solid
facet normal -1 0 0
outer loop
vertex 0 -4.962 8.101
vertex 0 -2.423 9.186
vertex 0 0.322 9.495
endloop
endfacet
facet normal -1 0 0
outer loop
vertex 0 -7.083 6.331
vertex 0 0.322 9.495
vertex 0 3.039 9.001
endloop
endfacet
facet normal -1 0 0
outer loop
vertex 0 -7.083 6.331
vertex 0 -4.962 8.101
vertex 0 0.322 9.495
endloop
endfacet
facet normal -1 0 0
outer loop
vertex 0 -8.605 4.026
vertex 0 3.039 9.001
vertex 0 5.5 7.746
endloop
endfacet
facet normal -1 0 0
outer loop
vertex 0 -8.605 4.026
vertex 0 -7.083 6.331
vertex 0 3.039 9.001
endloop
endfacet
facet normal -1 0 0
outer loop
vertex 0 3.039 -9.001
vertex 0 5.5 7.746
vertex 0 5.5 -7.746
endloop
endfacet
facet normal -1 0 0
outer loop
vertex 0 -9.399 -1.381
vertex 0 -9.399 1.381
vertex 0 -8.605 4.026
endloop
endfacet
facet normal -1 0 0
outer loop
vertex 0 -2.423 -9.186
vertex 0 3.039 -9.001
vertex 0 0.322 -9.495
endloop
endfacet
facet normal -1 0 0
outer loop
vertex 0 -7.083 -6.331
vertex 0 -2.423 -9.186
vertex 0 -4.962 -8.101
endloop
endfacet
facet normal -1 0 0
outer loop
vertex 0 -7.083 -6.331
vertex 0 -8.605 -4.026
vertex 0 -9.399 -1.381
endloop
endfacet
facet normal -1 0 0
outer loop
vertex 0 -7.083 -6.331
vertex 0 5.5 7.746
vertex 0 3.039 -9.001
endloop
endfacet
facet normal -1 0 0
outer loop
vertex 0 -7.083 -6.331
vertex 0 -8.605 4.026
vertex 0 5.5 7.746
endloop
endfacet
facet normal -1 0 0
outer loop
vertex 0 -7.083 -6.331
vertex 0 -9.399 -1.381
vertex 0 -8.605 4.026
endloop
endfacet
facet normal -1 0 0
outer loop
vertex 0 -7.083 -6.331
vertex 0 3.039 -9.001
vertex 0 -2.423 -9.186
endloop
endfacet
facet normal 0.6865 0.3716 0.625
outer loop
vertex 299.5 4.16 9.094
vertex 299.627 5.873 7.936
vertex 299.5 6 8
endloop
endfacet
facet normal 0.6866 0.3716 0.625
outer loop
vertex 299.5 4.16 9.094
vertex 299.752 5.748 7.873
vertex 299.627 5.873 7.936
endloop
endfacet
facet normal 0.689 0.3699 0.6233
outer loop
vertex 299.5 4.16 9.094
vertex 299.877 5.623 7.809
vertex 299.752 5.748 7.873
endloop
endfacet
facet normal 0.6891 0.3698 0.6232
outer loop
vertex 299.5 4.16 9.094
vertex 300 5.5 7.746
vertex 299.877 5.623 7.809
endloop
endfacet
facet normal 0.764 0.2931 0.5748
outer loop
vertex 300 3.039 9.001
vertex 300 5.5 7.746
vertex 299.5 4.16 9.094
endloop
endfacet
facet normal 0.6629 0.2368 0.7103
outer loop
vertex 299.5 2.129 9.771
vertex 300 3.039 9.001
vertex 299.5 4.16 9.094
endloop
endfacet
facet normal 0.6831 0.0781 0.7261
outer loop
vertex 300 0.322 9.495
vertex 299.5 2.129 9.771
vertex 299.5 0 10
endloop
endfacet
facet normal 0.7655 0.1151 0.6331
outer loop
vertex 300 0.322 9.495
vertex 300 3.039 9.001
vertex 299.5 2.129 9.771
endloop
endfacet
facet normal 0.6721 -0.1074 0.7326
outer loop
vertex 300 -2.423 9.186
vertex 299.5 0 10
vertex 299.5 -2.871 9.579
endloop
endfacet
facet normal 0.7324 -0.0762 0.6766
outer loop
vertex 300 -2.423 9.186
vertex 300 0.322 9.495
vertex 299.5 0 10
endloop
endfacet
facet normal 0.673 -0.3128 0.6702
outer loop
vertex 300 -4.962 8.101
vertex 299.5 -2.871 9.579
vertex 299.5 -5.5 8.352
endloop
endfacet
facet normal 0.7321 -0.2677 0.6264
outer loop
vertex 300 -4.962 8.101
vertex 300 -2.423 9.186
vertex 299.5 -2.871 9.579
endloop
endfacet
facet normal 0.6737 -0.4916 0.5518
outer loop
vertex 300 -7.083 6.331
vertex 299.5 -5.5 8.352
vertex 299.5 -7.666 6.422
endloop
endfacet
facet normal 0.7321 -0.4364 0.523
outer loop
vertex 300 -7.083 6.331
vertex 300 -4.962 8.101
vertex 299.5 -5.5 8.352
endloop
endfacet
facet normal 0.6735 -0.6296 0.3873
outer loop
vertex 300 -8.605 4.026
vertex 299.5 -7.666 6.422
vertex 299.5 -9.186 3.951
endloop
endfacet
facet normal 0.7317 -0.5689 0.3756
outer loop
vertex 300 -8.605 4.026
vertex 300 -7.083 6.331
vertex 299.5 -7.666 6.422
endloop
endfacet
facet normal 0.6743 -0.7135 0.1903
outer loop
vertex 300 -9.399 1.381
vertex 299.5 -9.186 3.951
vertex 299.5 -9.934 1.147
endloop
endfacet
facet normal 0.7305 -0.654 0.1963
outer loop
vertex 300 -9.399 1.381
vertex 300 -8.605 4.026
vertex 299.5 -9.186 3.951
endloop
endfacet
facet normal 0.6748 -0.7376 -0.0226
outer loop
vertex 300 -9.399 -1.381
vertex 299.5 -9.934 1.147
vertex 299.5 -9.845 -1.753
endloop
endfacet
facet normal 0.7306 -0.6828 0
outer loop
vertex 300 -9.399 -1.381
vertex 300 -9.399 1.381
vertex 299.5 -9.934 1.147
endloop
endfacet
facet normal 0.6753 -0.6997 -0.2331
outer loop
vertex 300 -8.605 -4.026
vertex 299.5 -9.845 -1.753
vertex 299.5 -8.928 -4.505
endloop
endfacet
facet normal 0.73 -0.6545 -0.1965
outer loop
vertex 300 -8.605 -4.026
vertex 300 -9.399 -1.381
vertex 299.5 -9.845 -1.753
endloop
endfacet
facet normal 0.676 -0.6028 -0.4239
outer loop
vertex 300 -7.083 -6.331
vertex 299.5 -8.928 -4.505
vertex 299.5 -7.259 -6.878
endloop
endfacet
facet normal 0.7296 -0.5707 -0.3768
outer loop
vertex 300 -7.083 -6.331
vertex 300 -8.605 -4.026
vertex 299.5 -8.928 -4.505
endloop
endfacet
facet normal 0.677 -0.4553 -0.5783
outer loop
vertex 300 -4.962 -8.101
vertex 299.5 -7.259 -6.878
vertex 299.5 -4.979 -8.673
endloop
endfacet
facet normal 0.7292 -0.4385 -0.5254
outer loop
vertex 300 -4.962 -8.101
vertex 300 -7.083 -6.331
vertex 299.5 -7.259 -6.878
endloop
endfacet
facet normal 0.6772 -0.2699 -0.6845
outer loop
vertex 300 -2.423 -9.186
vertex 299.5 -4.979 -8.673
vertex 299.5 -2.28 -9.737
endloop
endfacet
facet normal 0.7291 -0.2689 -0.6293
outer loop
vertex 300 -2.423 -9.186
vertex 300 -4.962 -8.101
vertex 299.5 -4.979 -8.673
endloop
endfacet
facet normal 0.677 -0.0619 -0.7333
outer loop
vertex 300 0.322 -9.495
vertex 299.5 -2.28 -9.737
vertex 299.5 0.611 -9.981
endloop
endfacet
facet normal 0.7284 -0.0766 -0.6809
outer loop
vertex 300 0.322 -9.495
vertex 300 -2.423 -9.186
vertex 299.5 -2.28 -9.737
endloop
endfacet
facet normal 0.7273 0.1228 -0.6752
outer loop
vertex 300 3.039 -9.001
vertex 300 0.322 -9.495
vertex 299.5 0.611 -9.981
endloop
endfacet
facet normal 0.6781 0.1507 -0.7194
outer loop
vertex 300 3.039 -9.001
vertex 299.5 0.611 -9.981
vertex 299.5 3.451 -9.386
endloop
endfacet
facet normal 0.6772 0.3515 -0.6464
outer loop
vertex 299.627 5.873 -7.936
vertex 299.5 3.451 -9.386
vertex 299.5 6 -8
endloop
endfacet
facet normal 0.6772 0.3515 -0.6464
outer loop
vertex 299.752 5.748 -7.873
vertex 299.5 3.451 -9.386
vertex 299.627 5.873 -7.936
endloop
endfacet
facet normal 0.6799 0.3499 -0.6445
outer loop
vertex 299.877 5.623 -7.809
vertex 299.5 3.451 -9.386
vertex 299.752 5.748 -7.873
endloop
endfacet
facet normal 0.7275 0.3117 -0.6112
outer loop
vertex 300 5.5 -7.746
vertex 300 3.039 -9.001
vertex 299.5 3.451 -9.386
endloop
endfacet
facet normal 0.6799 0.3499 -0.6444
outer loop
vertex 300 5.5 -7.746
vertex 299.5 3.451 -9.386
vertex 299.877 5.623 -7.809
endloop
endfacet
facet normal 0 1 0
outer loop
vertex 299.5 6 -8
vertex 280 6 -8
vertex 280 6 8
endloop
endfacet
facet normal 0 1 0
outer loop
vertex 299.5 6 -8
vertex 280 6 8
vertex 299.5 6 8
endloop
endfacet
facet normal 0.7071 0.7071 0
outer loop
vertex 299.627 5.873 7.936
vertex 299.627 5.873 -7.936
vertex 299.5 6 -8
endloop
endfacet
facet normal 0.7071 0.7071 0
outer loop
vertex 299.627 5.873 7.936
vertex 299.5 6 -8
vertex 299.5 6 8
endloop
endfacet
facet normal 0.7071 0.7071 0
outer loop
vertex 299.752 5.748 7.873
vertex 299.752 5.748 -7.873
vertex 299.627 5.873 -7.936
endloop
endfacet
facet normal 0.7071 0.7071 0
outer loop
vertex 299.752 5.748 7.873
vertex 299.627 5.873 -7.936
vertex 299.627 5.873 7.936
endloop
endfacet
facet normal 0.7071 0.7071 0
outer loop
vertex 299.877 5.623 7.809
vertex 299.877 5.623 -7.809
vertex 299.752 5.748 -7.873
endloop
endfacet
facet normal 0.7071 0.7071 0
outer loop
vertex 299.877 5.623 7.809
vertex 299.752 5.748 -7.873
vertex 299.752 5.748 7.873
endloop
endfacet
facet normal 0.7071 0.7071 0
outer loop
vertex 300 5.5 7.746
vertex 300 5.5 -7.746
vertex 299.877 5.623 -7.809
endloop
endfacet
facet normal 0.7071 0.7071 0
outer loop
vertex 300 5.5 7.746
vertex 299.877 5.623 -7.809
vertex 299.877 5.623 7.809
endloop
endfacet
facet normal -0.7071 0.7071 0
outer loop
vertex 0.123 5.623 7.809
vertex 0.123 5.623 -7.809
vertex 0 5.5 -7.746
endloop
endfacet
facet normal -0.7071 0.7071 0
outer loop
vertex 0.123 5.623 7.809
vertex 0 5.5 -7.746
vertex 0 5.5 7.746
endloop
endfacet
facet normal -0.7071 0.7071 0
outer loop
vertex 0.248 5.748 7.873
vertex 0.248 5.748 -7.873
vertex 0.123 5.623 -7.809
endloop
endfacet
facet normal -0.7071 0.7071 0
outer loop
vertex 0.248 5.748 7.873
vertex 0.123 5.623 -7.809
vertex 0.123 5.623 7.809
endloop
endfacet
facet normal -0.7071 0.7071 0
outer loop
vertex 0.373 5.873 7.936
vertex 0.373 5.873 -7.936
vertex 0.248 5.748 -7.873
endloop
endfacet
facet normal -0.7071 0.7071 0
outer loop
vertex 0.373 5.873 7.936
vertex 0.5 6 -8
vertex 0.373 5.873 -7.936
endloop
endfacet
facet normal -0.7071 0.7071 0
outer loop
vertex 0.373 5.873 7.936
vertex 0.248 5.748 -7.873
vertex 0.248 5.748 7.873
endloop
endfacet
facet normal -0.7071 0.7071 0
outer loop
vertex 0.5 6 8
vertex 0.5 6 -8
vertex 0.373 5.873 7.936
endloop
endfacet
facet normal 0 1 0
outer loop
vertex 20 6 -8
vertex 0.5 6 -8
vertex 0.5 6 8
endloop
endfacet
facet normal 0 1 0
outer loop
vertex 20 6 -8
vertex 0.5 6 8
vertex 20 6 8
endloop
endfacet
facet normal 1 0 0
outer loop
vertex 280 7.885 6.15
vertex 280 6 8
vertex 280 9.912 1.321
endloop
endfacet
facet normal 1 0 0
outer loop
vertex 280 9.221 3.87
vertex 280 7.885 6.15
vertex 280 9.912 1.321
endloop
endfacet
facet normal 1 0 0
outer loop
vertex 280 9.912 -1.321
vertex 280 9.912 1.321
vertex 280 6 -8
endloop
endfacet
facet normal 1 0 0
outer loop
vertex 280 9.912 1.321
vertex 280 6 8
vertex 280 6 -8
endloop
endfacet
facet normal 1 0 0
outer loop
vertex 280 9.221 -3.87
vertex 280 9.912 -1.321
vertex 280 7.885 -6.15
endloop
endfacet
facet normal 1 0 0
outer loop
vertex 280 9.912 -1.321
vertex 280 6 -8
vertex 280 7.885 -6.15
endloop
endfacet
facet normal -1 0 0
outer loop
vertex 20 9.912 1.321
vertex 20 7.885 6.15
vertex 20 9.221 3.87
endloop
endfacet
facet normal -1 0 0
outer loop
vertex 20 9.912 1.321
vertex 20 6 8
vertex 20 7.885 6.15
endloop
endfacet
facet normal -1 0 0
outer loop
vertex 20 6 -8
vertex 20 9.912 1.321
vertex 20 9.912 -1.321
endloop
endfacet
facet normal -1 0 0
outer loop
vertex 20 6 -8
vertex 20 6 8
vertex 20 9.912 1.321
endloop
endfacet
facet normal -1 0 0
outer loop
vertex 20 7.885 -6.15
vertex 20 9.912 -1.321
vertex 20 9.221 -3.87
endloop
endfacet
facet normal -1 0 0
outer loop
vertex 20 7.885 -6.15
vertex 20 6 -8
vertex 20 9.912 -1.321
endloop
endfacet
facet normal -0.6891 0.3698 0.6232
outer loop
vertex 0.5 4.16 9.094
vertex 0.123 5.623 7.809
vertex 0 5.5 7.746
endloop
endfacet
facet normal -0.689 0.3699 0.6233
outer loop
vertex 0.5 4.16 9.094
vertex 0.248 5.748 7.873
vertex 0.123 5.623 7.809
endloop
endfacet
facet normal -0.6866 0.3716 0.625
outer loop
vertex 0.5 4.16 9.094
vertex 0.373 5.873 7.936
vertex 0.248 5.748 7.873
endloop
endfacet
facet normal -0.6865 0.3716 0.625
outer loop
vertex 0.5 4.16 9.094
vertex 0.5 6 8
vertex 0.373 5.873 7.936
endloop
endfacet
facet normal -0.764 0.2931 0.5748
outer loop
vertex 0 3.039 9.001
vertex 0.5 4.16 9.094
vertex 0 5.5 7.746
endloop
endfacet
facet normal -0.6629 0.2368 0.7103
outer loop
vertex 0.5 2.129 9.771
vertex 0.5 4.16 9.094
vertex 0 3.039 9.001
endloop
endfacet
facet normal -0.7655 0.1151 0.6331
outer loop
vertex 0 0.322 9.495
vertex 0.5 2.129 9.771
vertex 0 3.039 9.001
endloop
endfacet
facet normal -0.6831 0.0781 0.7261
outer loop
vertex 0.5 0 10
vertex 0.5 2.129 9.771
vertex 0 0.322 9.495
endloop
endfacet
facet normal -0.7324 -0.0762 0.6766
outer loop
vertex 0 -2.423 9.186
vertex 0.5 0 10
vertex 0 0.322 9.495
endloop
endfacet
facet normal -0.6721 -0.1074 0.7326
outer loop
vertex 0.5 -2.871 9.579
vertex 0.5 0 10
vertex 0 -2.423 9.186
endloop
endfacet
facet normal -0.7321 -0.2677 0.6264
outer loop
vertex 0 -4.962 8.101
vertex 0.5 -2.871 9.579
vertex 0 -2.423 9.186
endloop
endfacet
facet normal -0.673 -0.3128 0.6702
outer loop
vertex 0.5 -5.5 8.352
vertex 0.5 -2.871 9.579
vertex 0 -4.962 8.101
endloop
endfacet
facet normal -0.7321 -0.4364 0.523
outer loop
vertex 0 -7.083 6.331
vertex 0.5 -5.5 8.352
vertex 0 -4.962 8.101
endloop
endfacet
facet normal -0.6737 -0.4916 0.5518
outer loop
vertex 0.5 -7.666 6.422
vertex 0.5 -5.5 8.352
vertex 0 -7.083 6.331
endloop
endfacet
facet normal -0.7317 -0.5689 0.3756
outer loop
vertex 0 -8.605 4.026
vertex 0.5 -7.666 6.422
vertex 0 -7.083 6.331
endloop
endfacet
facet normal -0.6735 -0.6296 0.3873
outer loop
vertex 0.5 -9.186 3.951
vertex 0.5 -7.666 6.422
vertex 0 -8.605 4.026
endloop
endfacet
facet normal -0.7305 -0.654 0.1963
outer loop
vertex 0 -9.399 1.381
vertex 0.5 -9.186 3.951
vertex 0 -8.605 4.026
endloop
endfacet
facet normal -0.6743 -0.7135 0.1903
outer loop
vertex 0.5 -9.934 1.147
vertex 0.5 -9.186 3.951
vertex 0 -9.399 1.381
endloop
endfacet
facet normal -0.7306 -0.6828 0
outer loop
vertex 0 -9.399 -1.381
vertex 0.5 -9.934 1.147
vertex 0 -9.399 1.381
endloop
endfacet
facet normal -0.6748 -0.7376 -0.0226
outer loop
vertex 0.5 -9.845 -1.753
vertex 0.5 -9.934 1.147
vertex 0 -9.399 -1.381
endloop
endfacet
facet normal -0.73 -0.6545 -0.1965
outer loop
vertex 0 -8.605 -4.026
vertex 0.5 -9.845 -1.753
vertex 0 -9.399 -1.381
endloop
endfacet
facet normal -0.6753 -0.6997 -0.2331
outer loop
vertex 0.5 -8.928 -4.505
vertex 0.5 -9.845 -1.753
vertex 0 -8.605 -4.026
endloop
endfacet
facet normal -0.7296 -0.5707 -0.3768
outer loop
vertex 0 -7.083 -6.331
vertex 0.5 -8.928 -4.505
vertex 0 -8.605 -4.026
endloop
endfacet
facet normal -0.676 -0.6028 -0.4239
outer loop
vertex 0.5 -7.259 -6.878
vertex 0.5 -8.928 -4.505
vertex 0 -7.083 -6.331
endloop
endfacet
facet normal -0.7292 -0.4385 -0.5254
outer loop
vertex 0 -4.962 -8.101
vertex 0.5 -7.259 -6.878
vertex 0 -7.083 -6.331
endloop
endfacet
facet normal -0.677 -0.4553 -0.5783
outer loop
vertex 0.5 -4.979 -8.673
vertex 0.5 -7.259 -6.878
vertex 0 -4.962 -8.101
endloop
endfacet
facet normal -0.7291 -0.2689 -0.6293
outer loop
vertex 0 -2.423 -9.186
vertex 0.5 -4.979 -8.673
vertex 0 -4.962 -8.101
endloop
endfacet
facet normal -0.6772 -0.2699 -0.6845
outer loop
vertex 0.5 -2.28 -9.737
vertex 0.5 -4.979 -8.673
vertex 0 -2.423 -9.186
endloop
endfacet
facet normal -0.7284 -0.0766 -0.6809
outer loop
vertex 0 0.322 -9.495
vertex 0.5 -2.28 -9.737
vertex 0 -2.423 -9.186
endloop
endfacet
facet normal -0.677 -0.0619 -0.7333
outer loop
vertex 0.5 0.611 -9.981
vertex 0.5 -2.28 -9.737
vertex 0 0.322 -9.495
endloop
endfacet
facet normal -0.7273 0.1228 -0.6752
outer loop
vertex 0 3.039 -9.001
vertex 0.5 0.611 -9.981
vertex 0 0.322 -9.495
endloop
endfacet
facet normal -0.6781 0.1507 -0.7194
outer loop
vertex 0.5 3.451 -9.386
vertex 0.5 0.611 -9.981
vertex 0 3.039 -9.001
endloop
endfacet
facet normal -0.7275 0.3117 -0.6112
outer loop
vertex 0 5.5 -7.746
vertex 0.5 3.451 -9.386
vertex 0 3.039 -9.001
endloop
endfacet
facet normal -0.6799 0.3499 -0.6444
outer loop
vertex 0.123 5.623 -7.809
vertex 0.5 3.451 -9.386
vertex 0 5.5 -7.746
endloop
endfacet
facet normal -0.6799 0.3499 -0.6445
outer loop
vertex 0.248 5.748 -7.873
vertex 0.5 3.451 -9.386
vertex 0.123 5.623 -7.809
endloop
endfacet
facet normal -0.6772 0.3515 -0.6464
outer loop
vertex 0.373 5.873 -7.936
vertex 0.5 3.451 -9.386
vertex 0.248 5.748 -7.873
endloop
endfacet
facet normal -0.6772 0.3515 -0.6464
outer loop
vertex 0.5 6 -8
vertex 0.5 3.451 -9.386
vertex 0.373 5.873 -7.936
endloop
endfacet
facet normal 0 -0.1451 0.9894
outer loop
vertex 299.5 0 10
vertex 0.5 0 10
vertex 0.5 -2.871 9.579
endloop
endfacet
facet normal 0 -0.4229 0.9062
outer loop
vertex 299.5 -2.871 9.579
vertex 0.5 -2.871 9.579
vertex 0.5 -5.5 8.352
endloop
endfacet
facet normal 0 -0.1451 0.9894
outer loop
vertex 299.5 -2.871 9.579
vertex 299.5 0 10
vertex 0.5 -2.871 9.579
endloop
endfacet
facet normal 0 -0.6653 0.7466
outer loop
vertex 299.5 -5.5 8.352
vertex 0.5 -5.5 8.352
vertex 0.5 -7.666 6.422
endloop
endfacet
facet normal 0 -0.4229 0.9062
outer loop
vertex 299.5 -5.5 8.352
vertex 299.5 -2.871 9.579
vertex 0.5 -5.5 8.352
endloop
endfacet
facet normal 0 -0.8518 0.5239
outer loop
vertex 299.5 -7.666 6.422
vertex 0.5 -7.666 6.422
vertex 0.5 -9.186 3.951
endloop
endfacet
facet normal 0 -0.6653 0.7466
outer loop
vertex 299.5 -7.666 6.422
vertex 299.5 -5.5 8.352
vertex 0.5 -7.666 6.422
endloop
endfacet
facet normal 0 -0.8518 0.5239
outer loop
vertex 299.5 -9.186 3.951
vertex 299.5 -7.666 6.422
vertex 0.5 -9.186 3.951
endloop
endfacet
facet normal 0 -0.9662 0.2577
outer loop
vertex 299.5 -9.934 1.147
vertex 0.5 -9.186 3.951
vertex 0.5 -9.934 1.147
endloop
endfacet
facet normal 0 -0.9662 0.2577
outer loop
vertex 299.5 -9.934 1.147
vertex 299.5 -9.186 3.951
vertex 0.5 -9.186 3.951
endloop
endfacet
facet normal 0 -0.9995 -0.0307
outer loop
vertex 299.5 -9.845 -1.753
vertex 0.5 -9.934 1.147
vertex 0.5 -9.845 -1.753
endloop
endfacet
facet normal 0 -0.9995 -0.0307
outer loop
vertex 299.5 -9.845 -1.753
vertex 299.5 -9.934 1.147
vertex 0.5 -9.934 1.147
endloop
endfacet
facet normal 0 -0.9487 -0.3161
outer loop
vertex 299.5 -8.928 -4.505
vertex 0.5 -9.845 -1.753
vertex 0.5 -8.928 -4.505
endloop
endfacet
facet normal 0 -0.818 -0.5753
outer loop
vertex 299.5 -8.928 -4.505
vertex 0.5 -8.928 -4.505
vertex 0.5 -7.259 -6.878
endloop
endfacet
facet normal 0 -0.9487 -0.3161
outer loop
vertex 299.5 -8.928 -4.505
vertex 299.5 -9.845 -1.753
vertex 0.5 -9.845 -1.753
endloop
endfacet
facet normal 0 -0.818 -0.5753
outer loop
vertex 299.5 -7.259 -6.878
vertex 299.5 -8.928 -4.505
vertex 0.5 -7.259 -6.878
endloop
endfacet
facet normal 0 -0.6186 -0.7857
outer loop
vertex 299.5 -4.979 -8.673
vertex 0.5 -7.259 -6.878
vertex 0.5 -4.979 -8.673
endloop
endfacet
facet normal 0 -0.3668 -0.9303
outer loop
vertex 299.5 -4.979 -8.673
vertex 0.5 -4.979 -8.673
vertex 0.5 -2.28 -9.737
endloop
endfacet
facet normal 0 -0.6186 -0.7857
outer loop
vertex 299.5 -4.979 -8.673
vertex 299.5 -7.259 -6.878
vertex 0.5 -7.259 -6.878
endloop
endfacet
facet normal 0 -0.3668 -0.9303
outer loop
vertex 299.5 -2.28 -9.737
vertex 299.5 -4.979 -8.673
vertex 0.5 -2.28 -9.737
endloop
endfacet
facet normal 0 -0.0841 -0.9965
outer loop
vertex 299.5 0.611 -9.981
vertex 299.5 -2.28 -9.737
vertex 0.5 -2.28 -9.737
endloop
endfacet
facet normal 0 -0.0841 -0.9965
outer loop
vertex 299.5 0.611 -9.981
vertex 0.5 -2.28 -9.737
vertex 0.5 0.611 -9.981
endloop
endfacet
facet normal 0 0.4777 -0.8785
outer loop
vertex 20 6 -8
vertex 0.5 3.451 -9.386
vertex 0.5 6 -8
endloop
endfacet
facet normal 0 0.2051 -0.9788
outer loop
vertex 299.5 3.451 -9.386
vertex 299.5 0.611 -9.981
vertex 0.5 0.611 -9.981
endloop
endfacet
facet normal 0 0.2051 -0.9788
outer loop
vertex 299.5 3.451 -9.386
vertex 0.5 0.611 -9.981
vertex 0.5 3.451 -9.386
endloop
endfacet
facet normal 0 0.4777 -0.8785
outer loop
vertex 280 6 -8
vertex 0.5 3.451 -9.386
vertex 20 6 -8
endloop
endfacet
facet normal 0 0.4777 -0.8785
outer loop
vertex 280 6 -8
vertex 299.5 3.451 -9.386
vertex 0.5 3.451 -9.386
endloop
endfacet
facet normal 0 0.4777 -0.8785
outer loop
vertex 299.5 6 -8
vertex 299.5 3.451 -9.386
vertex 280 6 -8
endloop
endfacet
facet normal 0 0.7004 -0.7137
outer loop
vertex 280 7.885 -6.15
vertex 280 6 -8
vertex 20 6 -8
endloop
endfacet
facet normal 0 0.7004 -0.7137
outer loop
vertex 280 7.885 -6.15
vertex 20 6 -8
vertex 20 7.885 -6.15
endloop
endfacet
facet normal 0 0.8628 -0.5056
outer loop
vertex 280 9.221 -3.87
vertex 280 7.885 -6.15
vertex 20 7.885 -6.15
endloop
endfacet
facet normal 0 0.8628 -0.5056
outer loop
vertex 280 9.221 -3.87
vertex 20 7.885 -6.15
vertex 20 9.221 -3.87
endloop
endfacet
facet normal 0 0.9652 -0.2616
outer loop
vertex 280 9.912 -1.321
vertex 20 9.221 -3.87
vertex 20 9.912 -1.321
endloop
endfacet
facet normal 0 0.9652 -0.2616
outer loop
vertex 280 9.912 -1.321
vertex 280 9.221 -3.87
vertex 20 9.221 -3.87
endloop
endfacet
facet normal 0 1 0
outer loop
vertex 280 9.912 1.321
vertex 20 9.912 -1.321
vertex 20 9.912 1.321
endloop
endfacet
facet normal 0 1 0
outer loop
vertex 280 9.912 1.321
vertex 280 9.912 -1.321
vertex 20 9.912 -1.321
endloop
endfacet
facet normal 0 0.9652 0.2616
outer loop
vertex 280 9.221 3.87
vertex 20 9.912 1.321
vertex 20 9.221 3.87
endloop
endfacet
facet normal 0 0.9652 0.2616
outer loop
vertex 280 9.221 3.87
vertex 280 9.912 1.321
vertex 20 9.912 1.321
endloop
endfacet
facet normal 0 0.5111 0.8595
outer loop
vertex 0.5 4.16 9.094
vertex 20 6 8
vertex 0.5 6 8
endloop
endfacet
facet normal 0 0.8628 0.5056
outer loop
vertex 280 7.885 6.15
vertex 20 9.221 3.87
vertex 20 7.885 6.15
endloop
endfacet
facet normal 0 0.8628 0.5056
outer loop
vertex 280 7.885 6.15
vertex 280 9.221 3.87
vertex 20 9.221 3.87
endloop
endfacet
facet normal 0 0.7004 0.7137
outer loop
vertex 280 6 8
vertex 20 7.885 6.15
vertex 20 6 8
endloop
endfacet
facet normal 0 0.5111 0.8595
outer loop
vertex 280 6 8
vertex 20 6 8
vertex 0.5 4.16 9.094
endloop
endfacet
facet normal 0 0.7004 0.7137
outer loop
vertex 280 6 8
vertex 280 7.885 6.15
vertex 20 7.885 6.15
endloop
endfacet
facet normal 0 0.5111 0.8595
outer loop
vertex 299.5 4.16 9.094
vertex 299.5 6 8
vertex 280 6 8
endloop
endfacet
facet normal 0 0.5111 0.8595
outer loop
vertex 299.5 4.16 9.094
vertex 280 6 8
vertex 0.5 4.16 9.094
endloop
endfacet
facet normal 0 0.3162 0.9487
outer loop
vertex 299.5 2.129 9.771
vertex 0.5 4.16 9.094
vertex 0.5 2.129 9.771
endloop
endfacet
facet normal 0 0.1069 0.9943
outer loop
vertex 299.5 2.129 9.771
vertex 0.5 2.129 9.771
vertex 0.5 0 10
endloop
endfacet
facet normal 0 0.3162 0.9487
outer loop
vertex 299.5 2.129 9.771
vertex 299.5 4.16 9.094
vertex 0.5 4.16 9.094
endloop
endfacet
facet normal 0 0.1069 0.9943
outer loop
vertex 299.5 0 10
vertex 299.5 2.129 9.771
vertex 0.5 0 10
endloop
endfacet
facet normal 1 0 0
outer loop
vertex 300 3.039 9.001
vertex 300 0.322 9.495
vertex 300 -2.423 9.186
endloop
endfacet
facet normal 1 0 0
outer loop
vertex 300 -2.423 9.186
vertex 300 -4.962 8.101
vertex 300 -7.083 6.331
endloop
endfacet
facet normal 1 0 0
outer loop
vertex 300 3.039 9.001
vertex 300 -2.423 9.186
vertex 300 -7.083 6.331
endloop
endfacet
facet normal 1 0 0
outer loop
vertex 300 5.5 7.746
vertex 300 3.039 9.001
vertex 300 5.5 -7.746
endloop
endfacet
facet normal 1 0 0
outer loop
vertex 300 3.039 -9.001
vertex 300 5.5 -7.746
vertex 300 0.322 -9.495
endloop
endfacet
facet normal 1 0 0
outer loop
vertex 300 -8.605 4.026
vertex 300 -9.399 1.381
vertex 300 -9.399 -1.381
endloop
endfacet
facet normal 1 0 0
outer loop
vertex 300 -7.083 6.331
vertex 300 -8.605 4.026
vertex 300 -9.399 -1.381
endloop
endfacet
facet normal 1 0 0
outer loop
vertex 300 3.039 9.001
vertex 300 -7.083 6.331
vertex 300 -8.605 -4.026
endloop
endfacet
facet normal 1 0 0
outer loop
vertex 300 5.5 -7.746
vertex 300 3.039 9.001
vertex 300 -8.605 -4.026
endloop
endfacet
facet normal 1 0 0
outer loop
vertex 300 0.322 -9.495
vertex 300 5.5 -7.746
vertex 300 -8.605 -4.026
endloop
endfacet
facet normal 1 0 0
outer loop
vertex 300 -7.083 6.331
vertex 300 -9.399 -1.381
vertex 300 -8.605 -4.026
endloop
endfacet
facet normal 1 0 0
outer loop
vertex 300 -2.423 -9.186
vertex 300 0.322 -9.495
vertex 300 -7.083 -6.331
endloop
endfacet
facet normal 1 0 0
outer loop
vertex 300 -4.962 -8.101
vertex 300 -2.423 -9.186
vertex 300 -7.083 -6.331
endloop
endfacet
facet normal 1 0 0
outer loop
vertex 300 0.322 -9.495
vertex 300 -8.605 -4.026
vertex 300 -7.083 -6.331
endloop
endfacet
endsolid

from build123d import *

# Parameters (mm, degrees)
SKETCH1_W               = 300
SKETCH1_H               = 10
CUT_EXTRUDE1_DEPTH      = 301.333148354
CUT_EXTRUDE1_DEPTH_BACK = 301.333148354
SKETCH2_W               = 20
SKETCH2_H               = 4
CHAMFER1_SIZE           = 0.5


with BuildPart() as part:
    # Sketch1 → Revolve1 (revolve)
    with BuildSketch(Plane.XY, mode=Mode.PRIVATE) as revolve1_sk:
        with Locations((150, 5)):
            Rectangle(SKETCH1_W, SKETCH1_H)
    revolve(revolve1_sk.sketch.rotate(Axis((0, 0, 0), (1, 0, 0)), 90), axis=Axis((0, 0, 0), (1, 0, 0)))

    # Sketch2 → Cut-Extrude1 (cut, two sides: drawn at the far end of the back side and taken through both)
    with BuildSketch(Plane.XY.offset(-CUT_EXTRUDE1_DEPTH_BACK)):
        with Locations((10, 8)):
            Rectangle(SKETCH2_W, SKETCH2_H)
        with Locations((290, 8)):
            Rectangle(SKETCH2_W, SKETCH2_H)
    extrude(amount=CUT_EXTRUDE1_DEPTH + CUT_EXTRUDE1_DEPTH_BACK, mode=Mode.SUBTRACT)

    # Chamfer1
    chamfer1_edges = [part.edges().sort_by_distance(p)[0] for p in [
        (0, 6, 0),
        (300, -9.486832981, -3.16227766),
        (300, 6, 0),
        (0, -9.486832981, -3.16227766),
    ]]
    chamfer(chamfer1_edges, length=CHAMFER1_SIZE)


solid = part.part
